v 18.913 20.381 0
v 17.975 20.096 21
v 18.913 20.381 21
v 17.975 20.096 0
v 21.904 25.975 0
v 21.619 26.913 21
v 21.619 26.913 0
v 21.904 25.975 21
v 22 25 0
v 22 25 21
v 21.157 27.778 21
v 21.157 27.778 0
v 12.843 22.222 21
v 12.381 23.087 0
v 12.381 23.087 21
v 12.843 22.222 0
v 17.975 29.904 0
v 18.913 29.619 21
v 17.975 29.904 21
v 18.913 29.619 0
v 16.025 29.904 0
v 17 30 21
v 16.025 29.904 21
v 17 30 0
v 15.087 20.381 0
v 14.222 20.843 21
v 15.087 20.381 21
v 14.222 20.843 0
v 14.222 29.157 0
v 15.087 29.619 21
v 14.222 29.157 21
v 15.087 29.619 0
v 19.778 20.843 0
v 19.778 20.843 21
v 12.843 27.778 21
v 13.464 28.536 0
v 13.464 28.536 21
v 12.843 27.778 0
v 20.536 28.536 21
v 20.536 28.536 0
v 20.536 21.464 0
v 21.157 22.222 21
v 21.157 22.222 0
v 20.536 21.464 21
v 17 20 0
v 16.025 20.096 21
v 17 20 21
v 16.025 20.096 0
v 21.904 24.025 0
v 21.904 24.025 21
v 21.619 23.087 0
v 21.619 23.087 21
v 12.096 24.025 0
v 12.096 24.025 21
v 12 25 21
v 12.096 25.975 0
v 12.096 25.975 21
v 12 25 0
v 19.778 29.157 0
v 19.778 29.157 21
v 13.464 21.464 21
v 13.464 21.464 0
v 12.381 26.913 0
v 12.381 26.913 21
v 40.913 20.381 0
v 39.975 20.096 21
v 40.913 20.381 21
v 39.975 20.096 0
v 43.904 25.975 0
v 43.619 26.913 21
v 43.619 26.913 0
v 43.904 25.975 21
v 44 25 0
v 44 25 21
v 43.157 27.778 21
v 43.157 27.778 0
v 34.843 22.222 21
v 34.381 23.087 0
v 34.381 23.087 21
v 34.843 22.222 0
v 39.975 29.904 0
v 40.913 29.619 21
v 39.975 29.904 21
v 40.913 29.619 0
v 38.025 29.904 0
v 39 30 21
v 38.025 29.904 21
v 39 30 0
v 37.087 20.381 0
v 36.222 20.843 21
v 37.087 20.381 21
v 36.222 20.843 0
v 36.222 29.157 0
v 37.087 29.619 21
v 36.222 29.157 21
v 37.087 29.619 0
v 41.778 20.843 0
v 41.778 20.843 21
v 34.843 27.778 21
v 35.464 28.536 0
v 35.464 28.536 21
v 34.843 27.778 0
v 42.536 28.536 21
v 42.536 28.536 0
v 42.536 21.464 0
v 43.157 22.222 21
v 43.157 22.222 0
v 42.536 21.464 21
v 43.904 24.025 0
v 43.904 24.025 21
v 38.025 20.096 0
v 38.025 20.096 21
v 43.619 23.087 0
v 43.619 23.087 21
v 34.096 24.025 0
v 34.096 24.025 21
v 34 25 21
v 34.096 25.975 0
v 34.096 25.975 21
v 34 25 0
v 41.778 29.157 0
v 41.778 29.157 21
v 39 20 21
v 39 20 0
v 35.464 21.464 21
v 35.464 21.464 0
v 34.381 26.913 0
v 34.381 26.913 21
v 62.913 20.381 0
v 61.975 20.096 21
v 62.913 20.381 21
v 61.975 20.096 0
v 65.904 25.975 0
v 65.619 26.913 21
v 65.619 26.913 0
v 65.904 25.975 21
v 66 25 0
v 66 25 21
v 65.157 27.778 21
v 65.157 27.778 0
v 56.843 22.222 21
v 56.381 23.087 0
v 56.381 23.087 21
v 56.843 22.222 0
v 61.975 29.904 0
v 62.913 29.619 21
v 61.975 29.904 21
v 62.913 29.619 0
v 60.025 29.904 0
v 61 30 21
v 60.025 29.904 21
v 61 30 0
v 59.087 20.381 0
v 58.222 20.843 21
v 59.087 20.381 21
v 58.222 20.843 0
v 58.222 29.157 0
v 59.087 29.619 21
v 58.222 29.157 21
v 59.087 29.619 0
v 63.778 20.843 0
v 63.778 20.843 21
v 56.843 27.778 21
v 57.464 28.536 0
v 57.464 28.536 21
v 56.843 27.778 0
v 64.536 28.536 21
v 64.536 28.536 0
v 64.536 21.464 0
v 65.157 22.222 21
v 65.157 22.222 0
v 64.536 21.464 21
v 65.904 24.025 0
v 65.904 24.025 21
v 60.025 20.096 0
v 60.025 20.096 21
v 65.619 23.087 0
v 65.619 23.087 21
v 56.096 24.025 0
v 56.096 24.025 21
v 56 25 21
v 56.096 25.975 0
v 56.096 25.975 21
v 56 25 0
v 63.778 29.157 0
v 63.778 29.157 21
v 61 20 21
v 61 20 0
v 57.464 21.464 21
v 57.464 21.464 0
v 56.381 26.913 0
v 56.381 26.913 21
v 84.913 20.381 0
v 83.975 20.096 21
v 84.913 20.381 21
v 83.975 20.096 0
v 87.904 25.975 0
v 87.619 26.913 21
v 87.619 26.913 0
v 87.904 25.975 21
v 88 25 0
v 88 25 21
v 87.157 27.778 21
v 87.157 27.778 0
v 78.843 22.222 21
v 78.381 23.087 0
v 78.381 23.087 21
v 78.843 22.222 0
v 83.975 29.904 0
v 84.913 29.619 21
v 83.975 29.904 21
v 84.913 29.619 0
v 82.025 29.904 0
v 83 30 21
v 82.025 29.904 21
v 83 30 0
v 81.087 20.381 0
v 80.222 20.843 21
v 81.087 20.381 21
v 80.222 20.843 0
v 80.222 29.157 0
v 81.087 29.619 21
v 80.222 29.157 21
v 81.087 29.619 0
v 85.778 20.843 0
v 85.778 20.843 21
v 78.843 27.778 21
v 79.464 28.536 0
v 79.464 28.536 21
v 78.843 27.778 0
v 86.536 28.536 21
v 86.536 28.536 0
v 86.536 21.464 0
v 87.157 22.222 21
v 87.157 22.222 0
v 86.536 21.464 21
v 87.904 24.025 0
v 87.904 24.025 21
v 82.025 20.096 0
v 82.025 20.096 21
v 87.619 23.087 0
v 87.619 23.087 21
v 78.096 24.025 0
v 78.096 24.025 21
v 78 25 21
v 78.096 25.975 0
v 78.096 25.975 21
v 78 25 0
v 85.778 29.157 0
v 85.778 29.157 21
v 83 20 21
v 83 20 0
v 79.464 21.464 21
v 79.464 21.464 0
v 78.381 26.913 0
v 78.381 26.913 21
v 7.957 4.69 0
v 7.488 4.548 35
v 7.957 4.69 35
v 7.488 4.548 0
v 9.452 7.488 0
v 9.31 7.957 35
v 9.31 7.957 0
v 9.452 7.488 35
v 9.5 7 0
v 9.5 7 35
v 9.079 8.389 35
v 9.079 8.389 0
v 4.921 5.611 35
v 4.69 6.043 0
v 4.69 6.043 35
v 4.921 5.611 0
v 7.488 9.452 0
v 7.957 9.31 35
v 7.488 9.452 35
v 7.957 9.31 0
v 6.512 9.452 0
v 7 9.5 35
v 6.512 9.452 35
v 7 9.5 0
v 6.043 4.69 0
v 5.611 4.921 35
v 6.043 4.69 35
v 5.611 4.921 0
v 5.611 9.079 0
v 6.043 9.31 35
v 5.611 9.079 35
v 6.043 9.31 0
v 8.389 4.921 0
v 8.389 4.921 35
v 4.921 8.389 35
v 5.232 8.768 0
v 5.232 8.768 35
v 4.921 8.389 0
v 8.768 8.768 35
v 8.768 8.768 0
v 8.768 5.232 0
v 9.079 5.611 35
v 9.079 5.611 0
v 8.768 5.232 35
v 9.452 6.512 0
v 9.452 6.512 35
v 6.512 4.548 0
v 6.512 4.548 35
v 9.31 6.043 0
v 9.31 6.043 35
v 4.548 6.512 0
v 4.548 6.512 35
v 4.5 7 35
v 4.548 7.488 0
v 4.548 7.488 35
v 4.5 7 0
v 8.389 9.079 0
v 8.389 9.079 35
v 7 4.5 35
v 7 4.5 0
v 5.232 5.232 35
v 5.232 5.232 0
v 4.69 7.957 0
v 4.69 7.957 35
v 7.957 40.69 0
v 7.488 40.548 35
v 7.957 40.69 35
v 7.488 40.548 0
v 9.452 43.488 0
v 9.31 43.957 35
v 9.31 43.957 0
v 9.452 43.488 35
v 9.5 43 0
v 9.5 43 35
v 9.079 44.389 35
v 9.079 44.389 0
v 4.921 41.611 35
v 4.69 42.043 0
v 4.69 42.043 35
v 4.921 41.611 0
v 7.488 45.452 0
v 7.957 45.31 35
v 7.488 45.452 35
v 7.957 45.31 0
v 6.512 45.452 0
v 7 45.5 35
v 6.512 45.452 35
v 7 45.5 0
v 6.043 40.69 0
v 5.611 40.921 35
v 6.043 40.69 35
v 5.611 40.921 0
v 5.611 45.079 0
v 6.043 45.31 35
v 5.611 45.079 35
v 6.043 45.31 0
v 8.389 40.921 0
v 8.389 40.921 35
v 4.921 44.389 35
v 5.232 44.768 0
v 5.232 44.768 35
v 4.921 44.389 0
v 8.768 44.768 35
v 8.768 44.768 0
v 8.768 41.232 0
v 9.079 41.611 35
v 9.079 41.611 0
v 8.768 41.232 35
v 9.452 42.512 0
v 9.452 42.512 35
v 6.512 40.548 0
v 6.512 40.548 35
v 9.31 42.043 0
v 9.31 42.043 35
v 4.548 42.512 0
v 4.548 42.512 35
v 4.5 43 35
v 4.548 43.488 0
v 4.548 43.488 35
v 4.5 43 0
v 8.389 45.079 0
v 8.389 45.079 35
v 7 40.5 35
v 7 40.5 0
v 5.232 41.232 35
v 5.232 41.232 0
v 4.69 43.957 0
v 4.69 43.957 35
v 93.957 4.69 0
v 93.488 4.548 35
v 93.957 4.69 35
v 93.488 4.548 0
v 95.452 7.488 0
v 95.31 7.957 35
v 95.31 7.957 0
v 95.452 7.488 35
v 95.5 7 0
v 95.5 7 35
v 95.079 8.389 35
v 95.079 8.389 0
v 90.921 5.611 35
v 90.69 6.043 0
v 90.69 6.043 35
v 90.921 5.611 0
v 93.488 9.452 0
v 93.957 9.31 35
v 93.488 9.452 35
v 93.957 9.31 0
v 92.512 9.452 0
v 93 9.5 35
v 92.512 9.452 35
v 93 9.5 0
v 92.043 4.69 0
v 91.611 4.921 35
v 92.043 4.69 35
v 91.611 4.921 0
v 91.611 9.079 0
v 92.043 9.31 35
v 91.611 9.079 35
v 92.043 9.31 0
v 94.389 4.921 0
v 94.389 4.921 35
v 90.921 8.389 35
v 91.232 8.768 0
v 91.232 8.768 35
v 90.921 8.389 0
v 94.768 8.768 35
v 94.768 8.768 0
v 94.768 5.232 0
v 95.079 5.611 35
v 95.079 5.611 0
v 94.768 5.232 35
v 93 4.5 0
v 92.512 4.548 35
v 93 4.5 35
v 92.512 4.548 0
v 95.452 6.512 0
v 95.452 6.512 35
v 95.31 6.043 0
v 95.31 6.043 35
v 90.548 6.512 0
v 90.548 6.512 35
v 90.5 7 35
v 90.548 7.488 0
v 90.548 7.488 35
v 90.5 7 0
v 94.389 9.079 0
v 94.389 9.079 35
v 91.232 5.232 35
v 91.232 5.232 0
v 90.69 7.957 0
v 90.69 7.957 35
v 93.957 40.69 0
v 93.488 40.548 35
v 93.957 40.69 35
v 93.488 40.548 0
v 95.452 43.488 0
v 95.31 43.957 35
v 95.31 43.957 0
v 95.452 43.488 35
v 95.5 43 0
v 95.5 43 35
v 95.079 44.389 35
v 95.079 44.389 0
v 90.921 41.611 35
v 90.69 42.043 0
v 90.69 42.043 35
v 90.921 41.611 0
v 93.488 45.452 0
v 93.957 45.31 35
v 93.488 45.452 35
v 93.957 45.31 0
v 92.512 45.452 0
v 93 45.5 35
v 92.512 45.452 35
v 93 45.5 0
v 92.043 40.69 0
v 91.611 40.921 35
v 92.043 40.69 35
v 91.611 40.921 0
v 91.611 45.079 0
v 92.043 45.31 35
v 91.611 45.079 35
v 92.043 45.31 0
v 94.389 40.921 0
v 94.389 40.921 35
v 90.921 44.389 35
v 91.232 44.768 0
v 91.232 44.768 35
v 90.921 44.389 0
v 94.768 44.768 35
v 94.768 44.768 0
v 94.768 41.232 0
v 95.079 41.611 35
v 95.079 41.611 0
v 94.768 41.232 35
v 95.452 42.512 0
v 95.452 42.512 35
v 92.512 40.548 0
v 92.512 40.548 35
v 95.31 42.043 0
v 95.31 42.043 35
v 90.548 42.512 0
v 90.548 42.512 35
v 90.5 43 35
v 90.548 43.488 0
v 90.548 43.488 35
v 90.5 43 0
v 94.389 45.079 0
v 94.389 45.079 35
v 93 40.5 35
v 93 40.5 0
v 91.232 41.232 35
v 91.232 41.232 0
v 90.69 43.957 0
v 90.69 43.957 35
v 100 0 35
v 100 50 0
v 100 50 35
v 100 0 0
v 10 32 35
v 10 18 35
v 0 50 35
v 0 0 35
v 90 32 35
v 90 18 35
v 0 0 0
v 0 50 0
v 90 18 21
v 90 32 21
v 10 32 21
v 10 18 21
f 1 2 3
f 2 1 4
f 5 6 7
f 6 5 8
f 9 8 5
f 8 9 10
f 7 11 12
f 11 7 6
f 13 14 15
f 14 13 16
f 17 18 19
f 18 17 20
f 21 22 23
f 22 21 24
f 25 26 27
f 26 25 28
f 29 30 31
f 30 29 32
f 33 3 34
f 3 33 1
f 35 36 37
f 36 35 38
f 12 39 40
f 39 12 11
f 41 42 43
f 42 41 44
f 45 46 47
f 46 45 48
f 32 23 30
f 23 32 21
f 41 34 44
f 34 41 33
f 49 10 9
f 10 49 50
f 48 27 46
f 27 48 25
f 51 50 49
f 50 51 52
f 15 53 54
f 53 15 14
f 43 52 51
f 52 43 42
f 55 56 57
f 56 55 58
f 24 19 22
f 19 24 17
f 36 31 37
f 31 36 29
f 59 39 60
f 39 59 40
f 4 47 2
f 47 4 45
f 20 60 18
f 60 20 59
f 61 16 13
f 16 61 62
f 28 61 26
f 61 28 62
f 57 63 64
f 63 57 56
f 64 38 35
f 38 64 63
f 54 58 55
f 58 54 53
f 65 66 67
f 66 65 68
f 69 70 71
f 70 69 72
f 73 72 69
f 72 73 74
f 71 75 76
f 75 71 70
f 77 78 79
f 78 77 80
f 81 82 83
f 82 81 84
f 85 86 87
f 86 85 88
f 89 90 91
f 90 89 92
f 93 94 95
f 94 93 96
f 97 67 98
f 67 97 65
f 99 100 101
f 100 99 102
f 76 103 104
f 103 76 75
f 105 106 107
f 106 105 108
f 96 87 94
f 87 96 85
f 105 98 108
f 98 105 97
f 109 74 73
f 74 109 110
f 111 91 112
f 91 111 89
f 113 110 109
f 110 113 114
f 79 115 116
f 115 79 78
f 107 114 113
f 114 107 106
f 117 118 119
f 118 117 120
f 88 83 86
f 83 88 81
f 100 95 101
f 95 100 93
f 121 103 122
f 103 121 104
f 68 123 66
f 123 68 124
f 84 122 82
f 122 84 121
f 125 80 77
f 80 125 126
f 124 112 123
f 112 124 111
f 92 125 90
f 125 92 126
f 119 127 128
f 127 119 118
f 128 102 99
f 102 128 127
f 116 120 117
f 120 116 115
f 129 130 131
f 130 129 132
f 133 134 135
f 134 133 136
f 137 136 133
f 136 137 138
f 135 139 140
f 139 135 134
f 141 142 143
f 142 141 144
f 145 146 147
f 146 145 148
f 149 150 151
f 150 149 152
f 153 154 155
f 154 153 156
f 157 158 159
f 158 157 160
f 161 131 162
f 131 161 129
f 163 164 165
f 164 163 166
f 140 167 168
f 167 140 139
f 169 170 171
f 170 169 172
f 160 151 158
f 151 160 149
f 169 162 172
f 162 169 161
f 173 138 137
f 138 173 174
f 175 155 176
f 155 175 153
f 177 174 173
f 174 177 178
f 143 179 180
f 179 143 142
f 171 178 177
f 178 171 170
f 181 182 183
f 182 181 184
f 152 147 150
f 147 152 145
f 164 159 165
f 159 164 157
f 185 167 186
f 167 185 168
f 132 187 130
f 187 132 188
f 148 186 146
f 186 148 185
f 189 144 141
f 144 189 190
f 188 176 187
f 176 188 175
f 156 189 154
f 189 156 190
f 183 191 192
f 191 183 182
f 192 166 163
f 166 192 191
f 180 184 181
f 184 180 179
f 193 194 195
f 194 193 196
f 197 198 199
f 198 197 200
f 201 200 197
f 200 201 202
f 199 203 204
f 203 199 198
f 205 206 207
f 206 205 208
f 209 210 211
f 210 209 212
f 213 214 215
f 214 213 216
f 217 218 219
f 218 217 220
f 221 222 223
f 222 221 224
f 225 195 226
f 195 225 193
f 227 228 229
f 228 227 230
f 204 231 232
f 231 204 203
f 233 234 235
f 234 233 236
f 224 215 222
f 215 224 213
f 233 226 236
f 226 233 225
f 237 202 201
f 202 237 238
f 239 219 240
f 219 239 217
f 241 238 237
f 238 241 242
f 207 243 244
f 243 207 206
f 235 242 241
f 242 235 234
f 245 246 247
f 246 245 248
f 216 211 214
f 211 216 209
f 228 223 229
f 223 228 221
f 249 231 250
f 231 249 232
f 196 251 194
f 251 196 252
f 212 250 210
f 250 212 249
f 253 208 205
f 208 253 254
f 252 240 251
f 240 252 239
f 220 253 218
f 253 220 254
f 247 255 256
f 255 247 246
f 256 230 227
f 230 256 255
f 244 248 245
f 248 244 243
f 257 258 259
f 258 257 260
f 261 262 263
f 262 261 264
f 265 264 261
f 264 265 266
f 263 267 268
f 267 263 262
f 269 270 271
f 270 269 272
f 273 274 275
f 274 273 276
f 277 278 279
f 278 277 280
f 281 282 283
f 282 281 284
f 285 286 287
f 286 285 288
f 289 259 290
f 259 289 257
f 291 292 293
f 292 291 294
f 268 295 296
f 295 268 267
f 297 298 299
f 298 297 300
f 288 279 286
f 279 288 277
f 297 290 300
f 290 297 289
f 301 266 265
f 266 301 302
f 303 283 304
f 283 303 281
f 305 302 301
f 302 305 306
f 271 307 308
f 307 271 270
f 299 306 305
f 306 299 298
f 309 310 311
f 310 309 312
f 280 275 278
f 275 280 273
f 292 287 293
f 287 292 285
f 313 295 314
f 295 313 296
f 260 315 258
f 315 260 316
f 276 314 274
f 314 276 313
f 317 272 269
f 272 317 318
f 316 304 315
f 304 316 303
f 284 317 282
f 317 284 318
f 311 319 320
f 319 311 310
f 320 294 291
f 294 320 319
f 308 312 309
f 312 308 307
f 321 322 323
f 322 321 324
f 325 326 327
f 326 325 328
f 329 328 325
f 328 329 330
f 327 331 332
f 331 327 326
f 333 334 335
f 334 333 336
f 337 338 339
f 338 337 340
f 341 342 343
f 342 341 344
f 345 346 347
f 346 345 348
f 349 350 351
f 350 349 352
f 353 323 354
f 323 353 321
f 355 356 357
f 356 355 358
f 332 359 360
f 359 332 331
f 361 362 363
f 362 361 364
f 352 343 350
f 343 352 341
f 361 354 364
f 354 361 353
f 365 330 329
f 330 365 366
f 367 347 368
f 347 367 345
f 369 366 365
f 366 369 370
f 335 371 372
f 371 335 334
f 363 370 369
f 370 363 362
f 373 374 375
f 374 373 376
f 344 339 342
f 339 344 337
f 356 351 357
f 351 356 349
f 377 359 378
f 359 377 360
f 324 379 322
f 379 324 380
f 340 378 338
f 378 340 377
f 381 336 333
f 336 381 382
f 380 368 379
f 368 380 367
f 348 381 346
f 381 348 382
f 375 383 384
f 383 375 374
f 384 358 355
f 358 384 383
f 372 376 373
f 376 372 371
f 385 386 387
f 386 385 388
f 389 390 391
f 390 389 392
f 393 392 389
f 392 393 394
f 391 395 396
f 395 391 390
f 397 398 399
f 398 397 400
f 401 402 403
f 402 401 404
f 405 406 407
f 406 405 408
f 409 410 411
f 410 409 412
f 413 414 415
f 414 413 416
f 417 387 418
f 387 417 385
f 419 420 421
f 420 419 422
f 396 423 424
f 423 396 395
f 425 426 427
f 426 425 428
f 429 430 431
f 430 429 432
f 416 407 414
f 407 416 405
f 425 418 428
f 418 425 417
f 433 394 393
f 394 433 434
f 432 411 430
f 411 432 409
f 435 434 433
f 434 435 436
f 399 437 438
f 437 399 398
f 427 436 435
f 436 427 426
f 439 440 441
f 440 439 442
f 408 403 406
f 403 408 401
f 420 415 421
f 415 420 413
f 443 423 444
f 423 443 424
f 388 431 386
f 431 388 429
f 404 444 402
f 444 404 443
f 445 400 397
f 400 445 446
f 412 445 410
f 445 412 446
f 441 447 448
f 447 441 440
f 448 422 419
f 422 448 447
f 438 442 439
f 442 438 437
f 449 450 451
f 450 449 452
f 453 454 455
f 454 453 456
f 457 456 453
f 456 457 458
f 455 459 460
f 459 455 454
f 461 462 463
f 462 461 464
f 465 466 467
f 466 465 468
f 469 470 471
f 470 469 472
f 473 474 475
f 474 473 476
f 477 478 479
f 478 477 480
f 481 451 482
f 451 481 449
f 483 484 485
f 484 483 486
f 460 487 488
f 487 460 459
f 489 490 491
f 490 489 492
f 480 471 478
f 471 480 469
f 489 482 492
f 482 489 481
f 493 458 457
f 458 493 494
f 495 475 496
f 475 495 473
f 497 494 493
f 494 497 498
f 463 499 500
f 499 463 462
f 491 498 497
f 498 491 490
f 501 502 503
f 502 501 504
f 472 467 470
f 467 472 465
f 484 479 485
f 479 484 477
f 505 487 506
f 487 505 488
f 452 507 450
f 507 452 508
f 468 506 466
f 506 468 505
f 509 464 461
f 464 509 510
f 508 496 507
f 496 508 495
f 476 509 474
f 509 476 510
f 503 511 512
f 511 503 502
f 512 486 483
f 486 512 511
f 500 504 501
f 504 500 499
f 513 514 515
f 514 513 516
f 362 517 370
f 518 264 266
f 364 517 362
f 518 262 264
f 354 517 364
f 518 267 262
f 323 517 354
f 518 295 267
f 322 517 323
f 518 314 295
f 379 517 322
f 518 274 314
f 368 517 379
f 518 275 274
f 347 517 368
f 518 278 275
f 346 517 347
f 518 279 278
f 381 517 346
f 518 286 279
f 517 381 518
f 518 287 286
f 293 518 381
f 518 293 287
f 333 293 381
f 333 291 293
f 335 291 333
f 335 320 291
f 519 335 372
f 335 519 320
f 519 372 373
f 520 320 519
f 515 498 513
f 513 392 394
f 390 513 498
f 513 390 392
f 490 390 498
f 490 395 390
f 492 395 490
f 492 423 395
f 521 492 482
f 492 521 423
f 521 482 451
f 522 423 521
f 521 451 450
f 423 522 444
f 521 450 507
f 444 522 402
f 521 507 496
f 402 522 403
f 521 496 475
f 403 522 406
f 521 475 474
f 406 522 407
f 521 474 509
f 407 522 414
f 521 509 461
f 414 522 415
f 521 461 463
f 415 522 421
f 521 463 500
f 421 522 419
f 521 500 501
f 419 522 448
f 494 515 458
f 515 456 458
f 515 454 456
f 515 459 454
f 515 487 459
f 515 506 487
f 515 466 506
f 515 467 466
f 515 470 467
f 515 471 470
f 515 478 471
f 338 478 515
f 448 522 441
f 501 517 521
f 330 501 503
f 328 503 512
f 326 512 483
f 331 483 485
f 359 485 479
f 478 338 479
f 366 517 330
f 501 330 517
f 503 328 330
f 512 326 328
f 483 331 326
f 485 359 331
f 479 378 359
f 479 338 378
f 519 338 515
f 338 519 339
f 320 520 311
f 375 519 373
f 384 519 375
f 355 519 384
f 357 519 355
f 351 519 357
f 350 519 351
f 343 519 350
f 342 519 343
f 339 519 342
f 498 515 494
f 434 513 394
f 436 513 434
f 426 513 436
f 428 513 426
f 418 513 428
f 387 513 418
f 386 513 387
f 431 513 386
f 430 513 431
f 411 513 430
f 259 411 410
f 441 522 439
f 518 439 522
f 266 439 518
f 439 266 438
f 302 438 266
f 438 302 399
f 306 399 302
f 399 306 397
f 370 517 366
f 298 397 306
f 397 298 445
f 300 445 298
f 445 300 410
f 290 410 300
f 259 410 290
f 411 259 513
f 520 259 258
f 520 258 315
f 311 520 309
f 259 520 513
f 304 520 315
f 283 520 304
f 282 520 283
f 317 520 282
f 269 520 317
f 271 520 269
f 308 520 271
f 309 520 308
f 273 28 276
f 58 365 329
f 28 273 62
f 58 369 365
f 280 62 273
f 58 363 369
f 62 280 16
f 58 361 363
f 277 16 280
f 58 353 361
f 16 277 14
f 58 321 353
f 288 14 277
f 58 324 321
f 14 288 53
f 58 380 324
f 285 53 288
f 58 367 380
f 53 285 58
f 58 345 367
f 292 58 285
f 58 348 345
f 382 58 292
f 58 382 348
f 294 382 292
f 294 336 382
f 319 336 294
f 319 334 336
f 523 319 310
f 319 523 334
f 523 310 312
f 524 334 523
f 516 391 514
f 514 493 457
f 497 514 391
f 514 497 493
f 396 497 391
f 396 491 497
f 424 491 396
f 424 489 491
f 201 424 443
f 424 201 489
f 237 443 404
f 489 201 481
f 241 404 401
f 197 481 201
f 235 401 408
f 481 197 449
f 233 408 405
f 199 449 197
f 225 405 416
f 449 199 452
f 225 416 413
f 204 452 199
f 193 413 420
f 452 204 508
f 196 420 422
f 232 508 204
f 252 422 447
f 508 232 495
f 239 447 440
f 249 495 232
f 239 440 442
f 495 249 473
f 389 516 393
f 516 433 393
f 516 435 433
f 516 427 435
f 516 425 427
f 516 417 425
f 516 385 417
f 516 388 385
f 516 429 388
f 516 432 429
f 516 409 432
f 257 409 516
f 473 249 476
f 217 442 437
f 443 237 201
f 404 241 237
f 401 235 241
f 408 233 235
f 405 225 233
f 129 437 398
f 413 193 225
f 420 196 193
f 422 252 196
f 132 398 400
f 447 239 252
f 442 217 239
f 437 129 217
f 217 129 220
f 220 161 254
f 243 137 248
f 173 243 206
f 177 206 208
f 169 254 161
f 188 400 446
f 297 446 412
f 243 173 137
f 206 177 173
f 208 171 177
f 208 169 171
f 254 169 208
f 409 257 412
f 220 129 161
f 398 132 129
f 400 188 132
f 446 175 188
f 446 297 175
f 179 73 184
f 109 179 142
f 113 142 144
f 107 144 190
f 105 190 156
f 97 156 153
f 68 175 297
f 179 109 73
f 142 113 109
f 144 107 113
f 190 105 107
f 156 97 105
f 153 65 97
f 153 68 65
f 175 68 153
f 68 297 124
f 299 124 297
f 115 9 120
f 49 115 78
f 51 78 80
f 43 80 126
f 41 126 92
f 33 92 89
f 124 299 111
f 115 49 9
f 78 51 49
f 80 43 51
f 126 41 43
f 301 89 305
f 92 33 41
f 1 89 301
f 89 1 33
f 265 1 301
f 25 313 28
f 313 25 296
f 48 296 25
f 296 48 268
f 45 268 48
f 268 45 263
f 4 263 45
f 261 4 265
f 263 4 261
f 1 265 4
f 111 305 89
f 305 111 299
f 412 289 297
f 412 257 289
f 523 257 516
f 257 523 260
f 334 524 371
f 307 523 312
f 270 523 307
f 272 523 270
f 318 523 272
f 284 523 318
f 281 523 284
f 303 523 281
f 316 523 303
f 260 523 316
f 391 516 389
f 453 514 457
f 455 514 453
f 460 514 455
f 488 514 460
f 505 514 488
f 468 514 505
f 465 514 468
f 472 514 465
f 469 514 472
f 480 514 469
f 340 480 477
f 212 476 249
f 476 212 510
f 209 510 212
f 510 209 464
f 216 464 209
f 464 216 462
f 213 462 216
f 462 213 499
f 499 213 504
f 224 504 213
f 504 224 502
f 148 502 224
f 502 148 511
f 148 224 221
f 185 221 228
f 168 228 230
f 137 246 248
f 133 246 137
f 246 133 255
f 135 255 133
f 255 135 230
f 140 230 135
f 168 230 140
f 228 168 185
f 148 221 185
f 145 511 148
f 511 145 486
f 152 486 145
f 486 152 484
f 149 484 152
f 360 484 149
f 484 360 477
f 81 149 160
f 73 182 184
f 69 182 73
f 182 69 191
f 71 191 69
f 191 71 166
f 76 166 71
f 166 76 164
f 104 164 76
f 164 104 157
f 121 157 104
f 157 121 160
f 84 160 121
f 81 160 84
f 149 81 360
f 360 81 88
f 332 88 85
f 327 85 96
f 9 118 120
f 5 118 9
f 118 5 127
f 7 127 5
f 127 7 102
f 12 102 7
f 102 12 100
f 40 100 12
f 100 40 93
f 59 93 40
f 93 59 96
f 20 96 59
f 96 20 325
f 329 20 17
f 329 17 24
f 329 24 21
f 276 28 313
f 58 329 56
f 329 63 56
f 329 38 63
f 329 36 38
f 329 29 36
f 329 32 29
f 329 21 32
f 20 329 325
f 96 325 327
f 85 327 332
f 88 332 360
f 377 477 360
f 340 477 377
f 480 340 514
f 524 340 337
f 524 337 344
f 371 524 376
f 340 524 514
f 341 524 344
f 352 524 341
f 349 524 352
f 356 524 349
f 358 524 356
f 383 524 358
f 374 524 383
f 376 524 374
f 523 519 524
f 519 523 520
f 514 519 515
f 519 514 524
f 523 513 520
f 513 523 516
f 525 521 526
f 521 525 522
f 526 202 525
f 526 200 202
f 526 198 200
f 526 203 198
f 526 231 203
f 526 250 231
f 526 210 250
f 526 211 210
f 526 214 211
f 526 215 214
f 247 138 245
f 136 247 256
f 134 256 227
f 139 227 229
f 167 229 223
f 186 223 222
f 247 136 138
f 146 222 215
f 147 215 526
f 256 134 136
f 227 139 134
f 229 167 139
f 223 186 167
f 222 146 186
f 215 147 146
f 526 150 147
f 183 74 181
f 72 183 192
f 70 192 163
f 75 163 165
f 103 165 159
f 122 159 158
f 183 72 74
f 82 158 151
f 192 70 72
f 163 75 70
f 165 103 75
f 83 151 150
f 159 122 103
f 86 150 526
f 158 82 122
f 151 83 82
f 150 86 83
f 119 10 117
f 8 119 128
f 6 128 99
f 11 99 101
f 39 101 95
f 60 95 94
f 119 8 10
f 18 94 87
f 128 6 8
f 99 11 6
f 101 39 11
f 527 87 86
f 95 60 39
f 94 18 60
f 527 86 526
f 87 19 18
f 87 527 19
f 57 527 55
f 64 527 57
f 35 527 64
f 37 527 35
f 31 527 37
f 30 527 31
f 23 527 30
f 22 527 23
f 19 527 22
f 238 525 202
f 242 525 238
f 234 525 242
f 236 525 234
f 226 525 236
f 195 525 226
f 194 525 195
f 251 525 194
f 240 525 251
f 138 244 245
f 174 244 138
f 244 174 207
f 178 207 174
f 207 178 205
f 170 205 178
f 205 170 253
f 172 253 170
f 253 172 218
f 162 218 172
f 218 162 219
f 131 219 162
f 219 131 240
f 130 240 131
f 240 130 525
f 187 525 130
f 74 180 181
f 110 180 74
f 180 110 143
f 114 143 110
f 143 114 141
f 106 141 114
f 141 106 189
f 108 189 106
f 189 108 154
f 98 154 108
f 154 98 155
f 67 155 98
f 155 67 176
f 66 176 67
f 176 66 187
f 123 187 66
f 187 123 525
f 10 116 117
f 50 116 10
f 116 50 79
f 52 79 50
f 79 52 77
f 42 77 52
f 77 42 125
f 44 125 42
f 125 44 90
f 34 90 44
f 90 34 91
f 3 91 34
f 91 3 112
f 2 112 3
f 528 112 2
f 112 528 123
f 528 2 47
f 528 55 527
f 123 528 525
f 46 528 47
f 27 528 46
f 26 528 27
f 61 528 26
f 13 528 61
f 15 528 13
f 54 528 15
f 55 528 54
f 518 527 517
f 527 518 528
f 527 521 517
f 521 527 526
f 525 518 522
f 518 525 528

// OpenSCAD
$fn = 32;

// ----------------------------------------------------------------------
// Manifold block: gallery_top manifold
// ----------------------------------------------------------------------

// --- parameters (mm) ---
block_l = 100;            // block length, X
block_w = 50;             // block width, Y
block_h = 35;             // block height, Z
port_d = 10;              // port bore diameter
port_pitch = 22;          // port pitch along X
gallery_d = 14;           // top gallery width, Y
gallery_depth = 14;       // gallery pocket depth
wall_p = 10;              // gallery end wall thickness, X
mnt_d = 5;                // mounting hole diameter
mnt_in = 7;               // mounting hole inset from the edges

n_ports = 4;  // ports in the row
port_x0 = (block_l - (n_ports - 1) * port_pitch) / 2;  // first port X

difference() {
  cube([block_l, block_w, block_h]);
  for (i = [0 : n_ports - 1])
    translate([port_x0 + i * port_pitch, block_w / 2, -1])
      cylinder(h = block_h + 2, d = port_d);
  translate([wall_p, block_w / 2 - gallery_d / 2, block_h - gallery_depth])
    cube([block_l - 2 * wall_p, gallery_d, gallery_depth + 1]);
  for (cx = [mnt_in, block_l - mnt_in])
    for (cy = [mnt_in, block_w - mnt_in])
      translate([cx, cy, -1]) cylinder(h = block_h + 2, d = mnt_d);
}
